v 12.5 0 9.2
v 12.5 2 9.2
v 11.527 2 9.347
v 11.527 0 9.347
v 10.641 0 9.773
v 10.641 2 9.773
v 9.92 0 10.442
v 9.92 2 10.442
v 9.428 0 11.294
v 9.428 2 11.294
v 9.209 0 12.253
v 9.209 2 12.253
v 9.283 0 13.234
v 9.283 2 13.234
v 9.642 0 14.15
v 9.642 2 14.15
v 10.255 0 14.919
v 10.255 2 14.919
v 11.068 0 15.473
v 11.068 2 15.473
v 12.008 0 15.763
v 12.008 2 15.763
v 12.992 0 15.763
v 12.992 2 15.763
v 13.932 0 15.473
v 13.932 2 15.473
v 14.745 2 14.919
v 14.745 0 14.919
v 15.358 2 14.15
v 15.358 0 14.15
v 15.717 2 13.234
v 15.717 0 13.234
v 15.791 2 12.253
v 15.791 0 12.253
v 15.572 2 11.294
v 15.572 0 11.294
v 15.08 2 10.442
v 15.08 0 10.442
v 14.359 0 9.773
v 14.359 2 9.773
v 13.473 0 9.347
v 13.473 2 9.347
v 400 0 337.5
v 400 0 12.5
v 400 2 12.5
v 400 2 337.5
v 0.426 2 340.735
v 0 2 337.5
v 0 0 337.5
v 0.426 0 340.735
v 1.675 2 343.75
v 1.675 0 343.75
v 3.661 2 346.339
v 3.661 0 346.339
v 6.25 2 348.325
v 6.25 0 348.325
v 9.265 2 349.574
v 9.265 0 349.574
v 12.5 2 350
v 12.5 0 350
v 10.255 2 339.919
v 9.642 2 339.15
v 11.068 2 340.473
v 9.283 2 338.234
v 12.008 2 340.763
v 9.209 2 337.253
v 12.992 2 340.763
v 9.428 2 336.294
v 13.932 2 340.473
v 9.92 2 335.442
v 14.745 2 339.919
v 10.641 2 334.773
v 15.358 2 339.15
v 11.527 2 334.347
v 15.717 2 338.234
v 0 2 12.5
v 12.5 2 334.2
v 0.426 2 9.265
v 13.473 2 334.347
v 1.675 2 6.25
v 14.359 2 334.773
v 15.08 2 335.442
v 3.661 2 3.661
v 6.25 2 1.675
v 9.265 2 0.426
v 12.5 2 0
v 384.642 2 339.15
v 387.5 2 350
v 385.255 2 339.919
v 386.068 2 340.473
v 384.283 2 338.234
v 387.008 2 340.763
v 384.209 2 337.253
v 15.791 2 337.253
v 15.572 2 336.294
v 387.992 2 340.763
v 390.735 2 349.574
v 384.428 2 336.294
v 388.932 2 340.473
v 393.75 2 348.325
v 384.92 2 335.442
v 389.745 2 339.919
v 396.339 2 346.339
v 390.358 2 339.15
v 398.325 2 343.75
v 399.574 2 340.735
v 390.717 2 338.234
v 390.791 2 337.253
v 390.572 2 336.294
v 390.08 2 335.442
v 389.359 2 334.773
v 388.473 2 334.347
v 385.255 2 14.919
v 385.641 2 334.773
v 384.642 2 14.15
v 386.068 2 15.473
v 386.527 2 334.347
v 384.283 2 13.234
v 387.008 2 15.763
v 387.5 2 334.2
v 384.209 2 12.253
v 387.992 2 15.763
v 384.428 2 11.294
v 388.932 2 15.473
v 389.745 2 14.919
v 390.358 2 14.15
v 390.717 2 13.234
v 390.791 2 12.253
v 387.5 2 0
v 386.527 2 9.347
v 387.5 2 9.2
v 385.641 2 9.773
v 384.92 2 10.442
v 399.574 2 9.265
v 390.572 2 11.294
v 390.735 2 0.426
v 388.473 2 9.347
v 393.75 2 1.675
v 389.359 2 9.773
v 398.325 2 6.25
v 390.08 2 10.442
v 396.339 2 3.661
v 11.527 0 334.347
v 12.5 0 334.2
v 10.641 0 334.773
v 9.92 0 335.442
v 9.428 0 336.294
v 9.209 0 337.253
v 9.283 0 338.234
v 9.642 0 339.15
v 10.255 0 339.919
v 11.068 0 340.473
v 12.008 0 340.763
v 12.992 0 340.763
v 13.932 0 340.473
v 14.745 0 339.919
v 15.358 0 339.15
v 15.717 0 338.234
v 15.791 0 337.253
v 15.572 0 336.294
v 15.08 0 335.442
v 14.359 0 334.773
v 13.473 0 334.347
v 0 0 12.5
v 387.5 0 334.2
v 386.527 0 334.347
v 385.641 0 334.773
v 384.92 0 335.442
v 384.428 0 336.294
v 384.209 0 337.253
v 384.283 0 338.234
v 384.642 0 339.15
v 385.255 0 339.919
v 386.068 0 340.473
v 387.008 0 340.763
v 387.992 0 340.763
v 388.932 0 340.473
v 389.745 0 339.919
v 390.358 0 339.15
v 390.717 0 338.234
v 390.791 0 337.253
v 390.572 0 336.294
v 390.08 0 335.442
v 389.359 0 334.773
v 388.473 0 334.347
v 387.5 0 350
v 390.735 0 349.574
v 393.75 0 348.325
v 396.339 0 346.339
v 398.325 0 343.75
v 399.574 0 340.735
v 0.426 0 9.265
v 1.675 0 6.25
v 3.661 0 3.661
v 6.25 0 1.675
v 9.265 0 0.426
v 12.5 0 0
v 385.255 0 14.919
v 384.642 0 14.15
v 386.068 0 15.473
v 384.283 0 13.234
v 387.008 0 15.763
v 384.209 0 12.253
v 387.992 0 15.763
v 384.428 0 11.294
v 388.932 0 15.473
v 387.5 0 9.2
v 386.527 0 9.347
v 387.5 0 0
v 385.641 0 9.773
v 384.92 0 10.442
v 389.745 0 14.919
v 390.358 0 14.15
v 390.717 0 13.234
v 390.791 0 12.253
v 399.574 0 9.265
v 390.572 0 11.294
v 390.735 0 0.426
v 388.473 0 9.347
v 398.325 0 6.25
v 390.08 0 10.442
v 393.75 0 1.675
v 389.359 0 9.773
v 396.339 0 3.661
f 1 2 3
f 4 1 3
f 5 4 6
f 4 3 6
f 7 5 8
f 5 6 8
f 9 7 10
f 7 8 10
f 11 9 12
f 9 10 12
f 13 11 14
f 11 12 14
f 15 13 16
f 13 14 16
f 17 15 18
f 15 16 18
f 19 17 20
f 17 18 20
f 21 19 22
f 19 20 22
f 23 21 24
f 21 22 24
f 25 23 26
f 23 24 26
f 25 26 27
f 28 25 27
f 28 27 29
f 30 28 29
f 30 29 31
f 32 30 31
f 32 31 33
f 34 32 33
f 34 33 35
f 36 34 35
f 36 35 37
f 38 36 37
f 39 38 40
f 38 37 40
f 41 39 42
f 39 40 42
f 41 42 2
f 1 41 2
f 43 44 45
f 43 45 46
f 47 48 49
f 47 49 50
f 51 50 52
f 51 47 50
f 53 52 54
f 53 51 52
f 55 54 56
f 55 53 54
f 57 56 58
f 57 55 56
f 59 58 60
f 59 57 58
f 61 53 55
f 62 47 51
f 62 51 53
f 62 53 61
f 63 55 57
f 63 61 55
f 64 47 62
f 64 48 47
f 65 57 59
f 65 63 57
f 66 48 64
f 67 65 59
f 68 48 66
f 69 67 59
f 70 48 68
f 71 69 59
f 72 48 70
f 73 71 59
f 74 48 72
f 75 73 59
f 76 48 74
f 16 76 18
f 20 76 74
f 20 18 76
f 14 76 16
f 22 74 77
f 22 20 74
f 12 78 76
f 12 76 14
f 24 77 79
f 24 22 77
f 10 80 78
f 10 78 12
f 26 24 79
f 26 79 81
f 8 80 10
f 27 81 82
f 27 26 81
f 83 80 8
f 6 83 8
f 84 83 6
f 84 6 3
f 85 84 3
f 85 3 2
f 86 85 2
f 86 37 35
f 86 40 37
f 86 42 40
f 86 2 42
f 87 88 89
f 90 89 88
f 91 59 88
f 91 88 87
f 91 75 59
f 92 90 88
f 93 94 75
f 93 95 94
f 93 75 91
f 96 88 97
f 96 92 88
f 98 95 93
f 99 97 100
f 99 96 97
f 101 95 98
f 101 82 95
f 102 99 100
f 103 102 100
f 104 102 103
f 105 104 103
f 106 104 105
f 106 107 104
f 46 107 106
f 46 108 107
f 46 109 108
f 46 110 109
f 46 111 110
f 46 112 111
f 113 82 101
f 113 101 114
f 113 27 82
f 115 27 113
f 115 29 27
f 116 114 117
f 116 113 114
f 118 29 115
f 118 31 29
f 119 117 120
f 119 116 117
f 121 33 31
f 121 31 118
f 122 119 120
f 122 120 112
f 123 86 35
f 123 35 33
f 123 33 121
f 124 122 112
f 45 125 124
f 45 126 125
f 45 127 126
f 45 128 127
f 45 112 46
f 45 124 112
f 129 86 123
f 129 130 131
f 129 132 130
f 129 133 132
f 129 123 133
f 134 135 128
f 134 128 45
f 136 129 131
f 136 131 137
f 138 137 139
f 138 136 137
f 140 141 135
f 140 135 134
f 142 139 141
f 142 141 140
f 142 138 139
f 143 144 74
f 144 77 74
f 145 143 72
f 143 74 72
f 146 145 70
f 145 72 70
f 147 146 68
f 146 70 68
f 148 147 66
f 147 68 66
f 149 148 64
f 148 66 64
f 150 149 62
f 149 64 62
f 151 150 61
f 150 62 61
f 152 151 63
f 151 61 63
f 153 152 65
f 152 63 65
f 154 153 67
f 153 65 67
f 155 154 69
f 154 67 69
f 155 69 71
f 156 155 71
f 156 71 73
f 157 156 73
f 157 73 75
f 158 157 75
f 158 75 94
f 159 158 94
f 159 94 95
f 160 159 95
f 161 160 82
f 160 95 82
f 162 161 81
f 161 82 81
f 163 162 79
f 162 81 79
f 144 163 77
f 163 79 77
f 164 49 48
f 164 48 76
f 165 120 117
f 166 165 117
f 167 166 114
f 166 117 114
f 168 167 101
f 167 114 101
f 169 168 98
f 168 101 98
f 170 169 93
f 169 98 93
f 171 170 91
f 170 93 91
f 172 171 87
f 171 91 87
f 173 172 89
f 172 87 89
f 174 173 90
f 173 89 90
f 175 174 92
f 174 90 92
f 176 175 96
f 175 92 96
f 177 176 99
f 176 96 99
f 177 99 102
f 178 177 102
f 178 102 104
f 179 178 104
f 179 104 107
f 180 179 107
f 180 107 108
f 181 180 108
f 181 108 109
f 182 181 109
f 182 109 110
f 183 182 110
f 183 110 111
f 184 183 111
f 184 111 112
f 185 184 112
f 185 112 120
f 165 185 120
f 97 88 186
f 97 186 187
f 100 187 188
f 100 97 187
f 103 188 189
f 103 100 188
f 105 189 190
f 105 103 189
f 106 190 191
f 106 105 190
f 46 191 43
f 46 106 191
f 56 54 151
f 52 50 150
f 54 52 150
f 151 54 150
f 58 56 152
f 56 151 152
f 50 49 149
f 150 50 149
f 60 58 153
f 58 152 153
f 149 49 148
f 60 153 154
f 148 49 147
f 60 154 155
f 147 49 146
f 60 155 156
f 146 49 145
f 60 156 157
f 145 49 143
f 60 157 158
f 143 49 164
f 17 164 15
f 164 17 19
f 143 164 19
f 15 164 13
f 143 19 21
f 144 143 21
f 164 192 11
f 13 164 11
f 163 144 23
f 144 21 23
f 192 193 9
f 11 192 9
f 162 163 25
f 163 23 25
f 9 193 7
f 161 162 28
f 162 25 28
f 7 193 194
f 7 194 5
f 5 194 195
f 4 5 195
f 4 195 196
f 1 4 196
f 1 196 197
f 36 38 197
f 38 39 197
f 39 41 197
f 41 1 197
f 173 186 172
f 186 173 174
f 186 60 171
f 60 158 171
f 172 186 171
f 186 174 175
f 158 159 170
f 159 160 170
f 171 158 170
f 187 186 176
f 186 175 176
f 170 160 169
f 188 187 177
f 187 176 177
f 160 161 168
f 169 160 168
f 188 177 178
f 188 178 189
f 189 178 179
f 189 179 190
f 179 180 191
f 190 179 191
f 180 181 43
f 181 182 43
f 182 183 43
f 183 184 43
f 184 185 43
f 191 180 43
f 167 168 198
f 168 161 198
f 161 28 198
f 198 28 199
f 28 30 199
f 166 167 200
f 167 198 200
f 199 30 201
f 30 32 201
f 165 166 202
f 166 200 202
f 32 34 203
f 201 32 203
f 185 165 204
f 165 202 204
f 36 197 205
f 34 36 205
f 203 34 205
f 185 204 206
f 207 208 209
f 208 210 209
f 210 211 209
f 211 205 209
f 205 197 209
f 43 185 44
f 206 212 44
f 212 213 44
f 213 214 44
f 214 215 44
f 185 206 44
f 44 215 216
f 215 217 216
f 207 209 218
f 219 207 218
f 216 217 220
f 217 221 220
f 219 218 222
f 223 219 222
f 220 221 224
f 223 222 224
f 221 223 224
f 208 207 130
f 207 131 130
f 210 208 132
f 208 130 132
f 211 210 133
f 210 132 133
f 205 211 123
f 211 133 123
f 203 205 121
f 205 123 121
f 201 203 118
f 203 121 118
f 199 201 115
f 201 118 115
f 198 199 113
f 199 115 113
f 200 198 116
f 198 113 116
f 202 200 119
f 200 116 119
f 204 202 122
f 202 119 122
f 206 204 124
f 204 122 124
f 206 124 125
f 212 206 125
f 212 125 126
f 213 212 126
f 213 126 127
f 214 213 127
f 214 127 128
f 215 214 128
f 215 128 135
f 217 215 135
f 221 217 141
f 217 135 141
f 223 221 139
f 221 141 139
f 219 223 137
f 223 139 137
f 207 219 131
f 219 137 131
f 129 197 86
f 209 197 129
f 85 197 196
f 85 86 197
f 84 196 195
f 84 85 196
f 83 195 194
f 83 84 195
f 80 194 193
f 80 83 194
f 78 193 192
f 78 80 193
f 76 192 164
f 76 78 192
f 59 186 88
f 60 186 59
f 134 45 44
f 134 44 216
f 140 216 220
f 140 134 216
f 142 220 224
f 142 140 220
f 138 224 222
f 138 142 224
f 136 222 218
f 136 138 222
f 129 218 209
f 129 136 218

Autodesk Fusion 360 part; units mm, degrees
sketch "Sketch1" plane through (0, 0, 0) normal (0, 1, 0) x (1, 0, 0)
  line L0 (0, 0) -> (400, 0)
  line L1 (400, 0) -> (400, -350)
  line L2 (400, -350) -> (0, -350)
  line L3 (0, -350) -> (0, 0)
  line L4 (12.5, -12.5) -> (387.5, -12.5) construction
  line L5 (387.5, -12.5) -> (387.5, -337.5) construction
  line L6 (387.5, -337.5) -> (12.5, -337.5) construction
  line L7 (12.5, -337.5) -> (12.5, -12.5) construction
  line L8 (0, -175) -> (400, -175) construction
  line L9 (200, 0) -> (200, -350) construction
  dimension "d1" = 350
  dimension "d2" = 400
  dimension "d3" = 325
  dimension "d4" = 375
extrude "Extrude1" add sketch "Sketch1" along normal blind 2
hole "Hole1" at (12.5, 0, 337.5) at (387.5, 0, 337.5) at (12.5, 0, 12.5) at (387.5, 0, 12.5) direction (0, 1, 0) diameter 6.6 end through all
fillet "Fillet1" radius 12.5 4 edges at (0, 1, 350) (400, 1, 350) (400, 1, 0) (0, 1, 0)
sketch "Sketch2" plane through (0, 0, 0) normal (0, -1, 0) x (1, 0, 0)
  arc A0 (0, 12.5) -> (12.5, 0) centre (12.5, 12.5) ccw
  line L0 (12.5, 0) -> (387.5, 0)
  arc A1 (387.5, 0) -> (400, 12.5) centre (387.5, 12.5) ccw
  line L1 (400, 12.5) -> (400, 337.5)
  arc A2 (400, 337.5) -> (387.5, 350) centre (387.5, 337.5) ccw
  line L2 (387.5, 350) -> (12.5, 350)
  arc A3 (12.5, 350) -> (0, 337.5) centre (12.5, 337.5) ccw
  line L3 (0, 337.5) -> (0, 12.5)
  circle A4 centre (12.5, 12.5) radius 3.3
  circle A5 centre (12.5, 337.5) radius 3.3
  circle A6 centre (387.5, 337.5) radius 3.3
  circle A7 centre (387.5, 12.5) radius 3.3
